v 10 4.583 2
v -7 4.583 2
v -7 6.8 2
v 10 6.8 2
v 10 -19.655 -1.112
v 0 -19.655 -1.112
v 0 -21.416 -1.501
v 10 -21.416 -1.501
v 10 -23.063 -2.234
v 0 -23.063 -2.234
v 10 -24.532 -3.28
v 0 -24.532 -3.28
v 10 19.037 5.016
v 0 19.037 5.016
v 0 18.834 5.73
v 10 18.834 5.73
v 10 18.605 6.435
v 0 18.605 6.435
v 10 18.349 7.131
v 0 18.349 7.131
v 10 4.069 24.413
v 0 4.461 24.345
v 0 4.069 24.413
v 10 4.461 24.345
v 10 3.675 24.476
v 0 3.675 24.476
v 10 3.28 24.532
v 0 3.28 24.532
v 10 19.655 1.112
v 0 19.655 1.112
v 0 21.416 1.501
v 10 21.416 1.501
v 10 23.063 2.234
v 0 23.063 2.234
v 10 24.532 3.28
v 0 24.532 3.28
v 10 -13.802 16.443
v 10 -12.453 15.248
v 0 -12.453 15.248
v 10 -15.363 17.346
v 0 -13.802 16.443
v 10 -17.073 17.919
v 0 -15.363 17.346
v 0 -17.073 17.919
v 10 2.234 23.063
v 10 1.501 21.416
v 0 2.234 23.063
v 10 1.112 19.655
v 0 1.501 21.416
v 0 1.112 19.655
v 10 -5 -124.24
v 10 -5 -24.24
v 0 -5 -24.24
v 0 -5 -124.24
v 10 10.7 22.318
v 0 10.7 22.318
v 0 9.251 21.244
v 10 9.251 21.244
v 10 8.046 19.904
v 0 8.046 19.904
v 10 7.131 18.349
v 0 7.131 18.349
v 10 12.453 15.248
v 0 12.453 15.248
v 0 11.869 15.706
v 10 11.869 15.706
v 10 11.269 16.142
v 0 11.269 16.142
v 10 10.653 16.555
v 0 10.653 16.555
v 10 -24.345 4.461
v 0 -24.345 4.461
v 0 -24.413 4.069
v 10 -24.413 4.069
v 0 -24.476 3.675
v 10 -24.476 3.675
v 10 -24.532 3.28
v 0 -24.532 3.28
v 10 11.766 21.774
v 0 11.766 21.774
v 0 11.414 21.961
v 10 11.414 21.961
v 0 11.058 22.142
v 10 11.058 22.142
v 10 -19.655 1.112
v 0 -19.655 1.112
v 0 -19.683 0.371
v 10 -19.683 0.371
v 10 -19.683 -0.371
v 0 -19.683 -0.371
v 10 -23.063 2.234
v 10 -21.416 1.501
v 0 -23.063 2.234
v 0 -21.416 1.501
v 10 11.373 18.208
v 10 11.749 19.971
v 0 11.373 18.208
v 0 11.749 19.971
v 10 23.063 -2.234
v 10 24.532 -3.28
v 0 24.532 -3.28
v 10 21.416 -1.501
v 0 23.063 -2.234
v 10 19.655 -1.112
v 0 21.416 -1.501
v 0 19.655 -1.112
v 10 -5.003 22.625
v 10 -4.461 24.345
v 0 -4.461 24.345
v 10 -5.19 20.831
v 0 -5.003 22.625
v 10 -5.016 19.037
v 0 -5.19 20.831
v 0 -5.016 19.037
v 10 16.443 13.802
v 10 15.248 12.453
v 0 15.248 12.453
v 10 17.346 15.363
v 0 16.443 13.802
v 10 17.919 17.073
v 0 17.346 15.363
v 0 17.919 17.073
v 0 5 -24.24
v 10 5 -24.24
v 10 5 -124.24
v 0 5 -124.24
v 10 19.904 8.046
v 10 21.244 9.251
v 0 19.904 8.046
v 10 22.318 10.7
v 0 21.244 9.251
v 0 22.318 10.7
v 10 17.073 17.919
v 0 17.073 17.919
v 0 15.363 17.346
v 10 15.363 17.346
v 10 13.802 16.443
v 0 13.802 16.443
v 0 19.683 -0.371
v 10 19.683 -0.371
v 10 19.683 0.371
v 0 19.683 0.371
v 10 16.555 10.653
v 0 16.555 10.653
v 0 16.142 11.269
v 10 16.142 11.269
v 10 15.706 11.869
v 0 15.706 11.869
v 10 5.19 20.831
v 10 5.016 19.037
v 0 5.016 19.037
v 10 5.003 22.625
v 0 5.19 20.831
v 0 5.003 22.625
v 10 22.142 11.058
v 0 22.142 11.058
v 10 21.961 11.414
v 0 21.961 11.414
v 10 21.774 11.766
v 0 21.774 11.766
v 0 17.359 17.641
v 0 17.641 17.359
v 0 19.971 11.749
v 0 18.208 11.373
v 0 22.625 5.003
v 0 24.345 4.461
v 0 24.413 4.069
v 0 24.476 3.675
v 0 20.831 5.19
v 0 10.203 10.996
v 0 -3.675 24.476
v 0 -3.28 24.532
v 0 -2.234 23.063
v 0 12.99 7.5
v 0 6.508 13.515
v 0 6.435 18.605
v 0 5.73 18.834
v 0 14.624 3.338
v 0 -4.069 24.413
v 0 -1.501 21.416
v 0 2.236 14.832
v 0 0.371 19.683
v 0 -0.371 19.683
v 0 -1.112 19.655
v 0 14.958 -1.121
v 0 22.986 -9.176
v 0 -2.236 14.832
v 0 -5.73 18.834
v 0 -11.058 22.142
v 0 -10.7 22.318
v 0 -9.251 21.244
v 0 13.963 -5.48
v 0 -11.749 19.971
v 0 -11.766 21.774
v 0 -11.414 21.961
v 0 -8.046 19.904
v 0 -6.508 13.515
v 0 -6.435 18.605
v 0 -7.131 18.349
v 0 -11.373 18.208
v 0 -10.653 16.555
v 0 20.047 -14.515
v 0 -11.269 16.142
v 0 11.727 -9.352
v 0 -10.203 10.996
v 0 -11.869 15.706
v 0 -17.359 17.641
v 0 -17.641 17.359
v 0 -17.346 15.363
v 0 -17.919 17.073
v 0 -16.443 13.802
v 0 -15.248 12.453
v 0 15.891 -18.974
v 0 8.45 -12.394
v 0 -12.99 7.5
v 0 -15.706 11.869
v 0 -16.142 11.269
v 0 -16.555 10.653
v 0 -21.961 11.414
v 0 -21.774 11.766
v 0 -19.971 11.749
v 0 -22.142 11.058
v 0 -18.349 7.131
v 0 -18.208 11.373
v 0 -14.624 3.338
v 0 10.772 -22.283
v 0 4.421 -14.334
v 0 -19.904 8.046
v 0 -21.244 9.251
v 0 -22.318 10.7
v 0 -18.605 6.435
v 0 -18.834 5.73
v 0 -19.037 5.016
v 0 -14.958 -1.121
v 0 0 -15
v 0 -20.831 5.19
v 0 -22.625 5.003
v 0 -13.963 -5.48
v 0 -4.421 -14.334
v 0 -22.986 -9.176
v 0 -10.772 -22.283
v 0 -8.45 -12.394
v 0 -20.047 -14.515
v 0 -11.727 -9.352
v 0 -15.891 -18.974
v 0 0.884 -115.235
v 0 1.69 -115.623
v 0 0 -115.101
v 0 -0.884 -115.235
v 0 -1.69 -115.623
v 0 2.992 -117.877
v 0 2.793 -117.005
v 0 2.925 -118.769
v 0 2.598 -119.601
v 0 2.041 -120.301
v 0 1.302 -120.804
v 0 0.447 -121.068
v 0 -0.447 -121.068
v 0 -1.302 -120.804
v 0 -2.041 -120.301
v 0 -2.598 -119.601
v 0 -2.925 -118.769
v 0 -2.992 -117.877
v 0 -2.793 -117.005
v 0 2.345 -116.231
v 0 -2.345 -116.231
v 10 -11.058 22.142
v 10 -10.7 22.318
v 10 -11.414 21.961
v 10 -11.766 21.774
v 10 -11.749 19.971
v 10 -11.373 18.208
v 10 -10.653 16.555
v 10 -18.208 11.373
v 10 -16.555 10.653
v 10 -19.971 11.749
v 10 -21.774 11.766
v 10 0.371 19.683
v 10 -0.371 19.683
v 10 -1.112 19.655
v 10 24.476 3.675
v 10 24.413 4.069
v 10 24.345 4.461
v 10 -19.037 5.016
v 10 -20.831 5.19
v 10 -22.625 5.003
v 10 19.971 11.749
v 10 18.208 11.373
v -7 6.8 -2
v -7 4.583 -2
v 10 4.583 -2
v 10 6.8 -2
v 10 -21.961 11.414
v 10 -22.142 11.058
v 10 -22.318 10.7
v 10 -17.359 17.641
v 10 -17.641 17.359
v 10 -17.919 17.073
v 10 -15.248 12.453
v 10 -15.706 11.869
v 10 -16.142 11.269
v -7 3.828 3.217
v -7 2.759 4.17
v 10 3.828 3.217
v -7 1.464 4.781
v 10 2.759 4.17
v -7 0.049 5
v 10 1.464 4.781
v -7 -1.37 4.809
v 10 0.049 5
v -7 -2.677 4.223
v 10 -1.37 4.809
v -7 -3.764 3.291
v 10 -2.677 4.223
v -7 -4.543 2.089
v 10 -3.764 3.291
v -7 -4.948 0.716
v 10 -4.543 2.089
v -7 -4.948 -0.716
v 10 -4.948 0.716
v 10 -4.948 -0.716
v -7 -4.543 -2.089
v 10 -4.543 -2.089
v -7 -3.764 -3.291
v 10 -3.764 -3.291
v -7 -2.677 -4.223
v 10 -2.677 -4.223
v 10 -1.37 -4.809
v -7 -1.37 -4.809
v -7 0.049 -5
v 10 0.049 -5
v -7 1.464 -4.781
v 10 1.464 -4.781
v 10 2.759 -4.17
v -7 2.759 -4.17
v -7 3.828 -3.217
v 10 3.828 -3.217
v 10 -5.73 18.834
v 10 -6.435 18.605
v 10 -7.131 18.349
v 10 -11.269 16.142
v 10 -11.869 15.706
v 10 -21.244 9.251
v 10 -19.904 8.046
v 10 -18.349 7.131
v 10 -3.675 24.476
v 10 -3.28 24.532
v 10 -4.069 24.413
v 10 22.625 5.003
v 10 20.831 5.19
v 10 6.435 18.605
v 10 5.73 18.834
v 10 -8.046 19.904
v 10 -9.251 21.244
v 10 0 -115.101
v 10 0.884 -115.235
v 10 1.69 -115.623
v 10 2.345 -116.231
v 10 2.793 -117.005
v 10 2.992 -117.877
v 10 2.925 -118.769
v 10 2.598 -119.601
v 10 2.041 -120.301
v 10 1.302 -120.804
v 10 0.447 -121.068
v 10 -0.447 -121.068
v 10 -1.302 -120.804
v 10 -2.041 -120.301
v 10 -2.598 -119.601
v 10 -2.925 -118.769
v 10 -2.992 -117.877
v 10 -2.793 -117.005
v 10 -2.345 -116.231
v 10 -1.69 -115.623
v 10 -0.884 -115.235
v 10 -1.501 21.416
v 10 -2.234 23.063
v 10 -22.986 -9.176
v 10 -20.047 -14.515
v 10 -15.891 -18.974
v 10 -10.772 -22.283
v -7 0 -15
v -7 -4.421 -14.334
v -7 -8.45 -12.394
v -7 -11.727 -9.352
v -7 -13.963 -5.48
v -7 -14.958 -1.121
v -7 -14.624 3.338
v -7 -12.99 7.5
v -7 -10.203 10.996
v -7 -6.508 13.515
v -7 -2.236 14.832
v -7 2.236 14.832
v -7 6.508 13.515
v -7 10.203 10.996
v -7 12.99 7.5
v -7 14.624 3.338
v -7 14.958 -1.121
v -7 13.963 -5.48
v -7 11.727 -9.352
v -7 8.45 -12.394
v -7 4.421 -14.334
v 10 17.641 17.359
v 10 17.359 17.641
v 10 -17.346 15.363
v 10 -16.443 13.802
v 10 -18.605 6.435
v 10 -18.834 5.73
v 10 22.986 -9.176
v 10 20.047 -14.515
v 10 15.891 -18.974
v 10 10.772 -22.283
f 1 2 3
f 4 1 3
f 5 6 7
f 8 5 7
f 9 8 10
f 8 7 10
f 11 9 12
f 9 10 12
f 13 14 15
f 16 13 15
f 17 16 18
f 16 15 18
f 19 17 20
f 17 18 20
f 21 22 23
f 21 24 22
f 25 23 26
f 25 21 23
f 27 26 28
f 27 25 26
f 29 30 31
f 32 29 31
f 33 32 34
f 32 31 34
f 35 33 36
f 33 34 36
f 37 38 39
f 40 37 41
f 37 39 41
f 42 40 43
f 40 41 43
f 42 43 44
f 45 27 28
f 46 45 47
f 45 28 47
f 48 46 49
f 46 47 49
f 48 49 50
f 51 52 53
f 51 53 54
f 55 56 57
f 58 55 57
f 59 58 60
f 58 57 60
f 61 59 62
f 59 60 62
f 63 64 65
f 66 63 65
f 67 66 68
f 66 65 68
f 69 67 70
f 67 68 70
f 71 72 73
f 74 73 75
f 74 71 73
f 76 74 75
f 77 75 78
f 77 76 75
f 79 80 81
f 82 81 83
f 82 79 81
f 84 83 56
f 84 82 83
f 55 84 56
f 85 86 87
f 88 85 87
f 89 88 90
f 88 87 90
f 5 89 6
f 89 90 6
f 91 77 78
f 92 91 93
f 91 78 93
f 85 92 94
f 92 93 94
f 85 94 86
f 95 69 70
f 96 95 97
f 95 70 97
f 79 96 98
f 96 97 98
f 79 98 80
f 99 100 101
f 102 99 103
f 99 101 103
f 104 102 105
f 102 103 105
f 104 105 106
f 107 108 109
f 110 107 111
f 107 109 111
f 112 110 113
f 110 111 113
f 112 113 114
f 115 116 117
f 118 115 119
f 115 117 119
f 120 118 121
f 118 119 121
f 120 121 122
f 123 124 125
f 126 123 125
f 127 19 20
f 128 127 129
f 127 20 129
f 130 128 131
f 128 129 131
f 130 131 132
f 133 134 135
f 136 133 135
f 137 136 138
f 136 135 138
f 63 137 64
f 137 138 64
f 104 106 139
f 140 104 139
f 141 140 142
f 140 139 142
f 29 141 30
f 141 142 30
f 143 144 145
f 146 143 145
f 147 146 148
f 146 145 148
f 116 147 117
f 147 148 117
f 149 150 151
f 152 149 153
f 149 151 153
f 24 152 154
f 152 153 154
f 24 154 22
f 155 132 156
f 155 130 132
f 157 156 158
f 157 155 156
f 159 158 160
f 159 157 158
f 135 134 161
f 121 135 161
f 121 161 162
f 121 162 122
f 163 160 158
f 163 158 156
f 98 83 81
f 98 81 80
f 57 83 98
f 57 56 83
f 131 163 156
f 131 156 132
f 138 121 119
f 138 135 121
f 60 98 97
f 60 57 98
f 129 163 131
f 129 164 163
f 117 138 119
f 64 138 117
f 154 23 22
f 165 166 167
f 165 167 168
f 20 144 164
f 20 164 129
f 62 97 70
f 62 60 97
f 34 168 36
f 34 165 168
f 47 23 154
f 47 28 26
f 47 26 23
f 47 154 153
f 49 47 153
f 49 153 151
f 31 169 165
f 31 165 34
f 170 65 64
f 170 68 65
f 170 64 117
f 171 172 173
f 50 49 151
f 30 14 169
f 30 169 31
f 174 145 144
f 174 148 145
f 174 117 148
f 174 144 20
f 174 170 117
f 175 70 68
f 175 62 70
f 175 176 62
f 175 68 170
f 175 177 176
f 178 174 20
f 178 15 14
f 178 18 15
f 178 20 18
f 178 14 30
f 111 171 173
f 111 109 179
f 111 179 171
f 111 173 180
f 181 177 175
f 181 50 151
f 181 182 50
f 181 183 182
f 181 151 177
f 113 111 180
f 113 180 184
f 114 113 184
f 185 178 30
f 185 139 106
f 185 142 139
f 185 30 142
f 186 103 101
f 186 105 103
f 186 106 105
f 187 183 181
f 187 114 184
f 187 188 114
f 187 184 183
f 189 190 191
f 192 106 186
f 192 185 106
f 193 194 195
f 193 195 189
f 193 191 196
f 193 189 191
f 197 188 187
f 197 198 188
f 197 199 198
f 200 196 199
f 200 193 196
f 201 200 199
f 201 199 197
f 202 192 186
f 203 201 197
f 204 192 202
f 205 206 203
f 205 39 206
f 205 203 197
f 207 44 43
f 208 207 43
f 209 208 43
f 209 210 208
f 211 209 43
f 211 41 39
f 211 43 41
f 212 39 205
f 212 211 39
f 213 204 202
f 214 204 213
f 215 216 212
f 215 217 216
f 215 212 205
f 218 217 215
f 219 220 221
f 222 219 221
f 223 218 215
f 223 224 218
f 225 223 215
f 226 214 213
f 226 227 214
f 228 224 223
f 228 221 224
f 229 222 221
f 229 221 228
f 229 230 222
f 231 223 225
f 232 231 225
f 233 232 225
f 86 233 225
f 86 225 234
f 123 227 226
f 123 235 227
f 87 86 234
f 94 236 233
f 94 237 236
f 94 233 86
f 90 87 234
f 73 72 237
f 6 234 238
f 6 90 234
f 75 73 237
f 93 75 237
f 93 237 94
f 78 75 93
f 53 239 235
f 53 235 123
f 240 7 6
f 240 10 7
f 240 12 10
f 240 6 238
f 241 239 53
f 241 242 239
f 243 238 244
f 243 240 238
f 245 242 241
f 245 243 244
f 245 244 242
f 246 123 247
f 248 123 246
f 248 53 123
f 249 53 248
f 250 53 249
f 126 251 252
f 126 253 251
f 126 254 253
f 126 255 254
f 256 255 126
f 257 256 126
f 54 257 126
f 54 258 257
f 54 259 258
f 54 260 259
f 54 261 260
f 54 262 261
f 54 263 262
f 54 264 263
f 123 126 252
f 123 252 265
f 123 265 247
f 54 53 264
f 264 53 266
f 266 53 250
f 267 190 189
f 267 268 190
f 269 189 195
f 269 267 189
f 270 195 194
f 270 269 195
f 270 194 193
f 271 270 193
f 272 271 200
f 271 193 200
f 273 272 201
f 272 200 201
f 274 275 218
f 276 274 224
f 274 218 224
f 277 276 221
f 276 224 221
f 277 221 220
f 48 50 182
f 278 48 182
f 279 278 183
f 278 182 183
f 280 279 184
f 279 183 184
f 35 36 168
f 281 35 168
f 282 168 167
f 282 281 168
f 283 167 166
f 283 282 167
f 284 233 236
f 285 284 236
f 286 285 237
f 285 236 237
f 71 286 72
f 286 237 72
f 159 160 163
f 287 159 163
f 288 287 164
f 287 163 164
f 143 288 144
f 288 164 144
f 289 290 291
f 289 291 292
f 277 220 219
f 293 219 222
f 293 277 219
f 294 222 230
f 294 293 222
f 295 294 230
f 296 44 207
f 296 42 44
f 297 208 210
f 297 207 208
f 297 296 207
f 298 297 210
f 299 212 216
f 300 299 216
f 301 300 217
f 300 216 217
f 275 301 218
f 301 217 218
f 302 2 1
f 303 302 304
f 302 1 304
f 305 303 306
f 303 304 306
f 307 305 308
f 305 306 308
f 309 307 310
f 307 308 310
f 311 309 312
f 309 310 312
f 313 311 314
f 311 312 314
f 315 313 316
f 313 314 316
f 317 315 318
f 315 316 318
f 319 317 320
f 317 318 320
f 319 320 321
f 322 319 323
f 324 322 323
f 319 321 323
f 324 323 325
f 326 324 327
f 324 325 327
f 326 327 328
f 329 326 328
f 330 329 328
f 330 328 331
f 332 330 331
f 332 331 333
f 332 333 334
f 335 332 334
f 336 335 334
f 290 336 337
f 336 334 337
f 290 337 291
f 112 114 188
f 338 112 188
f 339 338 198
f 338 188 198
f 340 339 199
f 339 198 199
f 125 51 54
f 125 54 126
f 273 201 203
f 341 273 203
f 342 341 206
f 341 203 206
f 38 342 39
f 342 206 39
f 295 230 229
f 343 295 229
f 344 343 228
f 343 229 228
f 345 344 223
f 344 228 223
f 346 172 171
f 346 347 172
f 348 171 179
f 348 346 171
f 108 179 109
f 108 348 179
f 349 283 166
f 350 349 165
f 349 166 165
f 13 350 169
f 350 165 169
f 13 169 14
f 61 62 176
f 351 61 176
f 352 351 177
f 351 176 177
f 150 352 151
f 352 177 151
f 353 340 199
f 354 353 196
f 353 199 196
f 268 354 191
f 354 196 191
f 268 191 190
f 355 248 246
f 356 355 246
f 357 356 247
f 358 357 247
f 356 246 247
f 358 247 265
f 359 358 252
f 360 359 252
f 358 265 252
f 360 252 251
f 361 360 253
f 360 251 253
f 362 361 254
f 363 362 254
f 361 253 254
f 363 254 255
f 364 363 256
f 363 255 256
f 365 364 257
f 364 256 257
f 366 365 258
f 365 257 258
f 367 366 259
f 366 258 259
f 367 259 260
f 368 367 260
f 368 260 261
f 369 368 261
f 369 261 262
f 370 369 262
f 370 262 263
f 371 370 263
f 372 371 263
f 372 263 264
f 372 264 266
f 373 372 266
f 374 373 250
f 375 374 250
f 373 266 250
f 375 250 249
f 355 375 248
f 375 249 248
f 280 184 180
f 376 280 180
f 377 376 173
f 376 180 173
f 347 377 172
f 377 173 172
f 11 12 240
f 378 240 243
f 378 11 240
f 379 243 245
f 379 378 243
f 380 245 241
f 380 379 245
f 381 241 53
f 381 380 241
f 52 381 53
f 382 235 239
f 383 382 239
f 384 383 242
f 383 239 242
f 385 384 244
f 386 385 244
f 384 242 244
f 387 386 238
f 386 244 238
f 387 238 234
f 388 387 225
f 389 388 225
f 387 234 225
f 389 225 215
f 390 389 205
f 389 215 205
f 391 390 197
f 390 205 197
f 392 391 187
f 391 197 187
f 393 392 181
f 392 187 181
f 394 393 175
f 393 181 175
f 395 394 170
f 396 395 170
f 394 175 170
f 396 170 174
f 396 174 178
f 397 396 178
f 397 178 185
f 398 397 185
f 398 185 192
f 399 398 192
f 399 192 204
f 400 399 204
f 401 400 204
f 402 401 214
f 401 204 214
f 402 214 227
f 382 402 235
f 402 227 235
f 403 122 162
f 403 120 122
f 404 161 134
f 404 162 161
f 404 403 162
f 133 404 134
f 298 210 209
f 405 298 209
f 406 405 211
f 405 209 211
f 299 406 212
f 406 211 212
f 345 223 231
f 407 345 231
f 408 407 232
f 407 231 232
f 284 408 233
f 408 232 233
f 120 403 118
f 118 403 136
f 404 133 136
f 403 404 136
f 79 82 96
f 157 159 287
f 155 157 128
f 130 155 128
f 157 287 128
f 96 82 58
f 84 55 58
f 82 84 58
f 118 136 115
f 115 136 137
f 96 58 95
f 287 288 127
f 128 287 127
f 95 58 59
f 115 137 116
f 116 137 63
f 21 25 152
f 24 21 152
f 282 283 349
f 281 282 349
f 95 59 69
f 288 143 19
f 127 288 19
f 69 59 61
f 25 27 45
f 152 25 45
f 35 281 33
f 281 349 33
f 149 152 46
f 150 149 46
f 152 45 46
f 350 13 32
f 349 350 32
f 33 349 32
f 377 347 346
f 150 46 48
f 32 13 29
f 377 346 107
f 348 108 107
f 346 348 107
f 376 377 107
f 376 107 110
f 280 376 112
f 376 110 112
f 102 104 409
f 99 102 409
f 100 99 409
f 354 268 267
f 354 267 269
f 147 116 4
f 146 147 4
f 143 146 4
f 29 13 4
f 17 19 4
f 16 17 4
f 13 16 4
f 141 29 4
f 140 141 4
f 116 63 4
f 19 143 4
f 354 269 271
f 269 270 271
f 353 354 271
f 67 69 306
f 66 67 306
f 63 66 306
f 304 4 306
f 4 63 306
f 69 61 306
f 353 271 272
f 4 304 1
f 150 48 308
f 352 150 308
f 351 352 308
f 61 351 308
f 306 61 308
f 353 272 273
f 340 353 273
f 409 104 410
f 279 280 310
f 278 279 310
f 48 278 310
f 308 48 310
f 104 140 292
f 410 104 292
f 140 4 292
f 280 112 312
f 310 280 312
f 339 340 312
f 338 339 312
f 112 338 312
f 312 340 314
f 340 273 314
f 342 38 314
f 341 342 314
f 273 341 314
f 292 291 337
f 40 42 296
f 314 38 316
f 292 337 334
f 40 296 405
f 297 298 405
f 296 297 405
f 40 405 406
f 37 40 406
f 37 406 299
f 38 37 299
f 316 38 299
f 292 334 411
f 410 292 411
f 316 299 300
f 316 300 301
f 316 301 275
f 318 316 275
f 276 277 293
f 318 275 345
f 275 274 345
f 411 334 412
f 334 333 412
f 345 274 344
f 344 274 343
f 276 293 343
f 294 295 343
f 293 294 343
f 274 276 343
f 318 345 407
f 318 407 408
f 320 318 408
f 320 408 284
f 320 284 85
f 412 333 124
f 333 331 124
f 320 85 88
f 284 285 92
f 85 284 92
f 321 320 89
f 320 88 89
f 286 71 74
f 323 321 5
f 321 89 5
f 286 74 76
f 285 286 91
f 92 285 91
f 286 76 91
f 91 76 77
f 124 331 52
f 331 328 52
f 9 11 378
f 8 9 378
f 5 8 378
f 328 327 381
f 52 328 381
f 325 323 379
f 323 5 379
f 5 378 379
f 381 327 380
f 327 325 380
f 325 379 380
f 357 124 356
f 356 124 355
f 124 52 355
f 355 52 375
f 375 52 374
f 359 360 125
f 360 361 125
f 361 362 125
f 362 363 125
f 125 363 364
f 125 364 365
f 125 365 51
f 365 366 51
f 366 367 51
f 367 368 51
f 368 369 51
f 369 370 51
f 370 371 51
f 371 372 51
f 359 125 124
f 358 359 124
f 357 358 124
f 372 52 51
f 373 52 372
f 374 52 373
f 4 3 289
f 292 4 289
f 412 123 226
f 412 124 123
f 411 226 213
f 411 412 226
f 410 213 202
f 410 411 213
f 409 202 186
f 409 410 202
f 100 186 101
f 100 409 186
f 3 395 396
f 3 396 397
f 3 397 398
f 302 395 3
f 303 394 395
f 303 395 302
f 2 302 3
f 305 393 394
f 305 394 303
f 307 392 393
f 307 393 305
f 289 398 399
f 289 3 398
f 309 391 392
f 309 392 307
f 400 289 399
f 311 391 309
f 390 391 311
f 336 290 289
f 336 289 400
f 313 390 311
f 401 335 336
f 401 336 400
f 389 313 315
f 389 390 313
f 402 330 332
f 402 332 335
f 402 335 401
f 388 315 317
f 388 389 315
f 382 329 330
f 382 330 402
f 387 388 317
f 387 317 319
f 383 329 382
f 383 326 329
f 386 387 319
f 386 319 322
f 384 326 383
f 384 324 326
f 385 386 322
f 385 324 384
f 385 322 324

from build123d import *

# Parameters (mm, degrees)
BASPROSKE_W             = 10
BASPROSKE_H             = 24.75
TOOTHCUT_DEPTH          = 37.402266413
TEETHCUTS_COUNT         = 11
TEETHCUTS_ANGLE         = 180
HUBNEAONESKE_R          = 15
HUBNEARONE_DEPTH        = 7.0000508
BORSKE_R                = 5
BORE_DEPTH              = 10.0000508
KEYSKE_W                = 4
KEYSKE_H                = 6.8
KEYWAY_DEPTH            = 10.0000508
ESQUISSE1_W             = 100
ESQUISSE1_H             = 10
BOSS_EXTRU_1_DEPTH      = 10
ESQUISSE2_R             = 3
ENL_V_MAT_EXTRU_2_DEPTH = 10


with BuildPart() as part:
    # BasProSke → Base-Revolve (revolve)
    with BuildSketch(Plane(origin=(0, 0, 0), x_dir=(1, 0, 0), z_dir=(0, 1, 0)), mode=Mode.PRIVATE) as base_revolve_sk:
        with Locations((5, 12.375)):
            Rectangle(BASPROSKE_W, BASPROSKE_H)
    revolve(base_revolve_sk.sketch.rotate(Axis((-10, 0, 0), (1, 0, 0)), 180), axis=Axis((-10, 0, 0), (1, 0, 0)))

    # TooCutSke → ToothCut (cut, through all)
    with BuildSketch(Plane(origin=(0, 0, 0), x_dir=(0, 0, -1), z_dir=(1, 0, 0))):
        with BuildLine():
            ThreePointArc((1.111948432, 19.655071939), (0, 19.6865), (-1.111948432, 19.655071939))
            ThreePointArc((-1.111948432, 19.655071939), (-1.832349961, 22.271720111), (-3.300041734, 24.55463642))
            ThreePointArc((-3.300041734, 24.55463642), (0, 24.7754), (3.300041734, 24.55463642))
            ThreePointArc((3.300041734, 24.55463642), (1.832349961, 22.271720111), (1.111948432, 19.655071939))
        make_face()
    toothcut = extrude(amount=TOOTHCUT_DEPTH, mode=Mode.SUBTRACT)

    # TeethCuts: ToothCut ×11 about axis
    teethcuts_axis = Axis((-10, 0, 0), (1, 0, 0))
    for i in range(1, TEETHCUTS_COUNT):
        add(toothcut.rotate(teethcuts_axis, i * TEETHCUTS_ANGLE / (TEETHCUTS_COUNT - 1)), mode=Mode.SUBTRACT)

    # HubNeaOneSke → HubNearOne (add)
    with BuildSketch(Plane.ZY):
        with Locations(Location((0, 0, 0), (0, 0, 180))):
            Circle(HUBNEAONESKE_R)
    extrude(amount=HUBNEARONE_DEPTH)

    # BorSke → Bore (cut, symmetric)
    with BuildSketch(Plane(origin=(0, 0, 0), x_dir=(0, 0, -1), z_dir=(1, 0, 0))):
        with Locations(Location((0, 0, 0), (0, 0, 180))):
            Circle(BORSKE_R)
    extrude(amount=BORE_DEPTH, both=True, mode=Mode.SUBTRACT)

    # KeySke → Keyway (cut, symmetric)
    with BuildSketch(Plane(origin=(0, 0, 0), x_dir=(0, 0, -1), z_dir=(1, 0, 0))):
        with Locations((0, 3.4)):
            Rectangle(KEYSKE_W, KEYSKE_H)
    extrude(amount=KEYWAY_DEPTH, both=True, mode=Mode.SUBTRACT)

    # Esquisse1 → Boss.-Extru.1 (add)
    with BuildSketch(Plane(origin=(10, 0, 0), x_dir=(0, 0, -1), z_dir=(1, 0, 0))):
        with Locations((74.239688529, 0)):
            Rectangle(ESQUISSE1_W, ESQUISSE1_H)
    extrude(amount=-BOSS_EXTRU_1_DEPTH)

    # Esquisse2 → Enlèv. mat.-Extru.2 (cut)
    with BuildSketch(Plane.ZY):
        with Locations((-118.101402352, 0)):
            Circle(ESQUISSE2_R)
    extrude(amount=-ENL_V_MAT_EXTRU_2_DEPTH, mode=Mode.SUBTRACT)


solid = part.part
